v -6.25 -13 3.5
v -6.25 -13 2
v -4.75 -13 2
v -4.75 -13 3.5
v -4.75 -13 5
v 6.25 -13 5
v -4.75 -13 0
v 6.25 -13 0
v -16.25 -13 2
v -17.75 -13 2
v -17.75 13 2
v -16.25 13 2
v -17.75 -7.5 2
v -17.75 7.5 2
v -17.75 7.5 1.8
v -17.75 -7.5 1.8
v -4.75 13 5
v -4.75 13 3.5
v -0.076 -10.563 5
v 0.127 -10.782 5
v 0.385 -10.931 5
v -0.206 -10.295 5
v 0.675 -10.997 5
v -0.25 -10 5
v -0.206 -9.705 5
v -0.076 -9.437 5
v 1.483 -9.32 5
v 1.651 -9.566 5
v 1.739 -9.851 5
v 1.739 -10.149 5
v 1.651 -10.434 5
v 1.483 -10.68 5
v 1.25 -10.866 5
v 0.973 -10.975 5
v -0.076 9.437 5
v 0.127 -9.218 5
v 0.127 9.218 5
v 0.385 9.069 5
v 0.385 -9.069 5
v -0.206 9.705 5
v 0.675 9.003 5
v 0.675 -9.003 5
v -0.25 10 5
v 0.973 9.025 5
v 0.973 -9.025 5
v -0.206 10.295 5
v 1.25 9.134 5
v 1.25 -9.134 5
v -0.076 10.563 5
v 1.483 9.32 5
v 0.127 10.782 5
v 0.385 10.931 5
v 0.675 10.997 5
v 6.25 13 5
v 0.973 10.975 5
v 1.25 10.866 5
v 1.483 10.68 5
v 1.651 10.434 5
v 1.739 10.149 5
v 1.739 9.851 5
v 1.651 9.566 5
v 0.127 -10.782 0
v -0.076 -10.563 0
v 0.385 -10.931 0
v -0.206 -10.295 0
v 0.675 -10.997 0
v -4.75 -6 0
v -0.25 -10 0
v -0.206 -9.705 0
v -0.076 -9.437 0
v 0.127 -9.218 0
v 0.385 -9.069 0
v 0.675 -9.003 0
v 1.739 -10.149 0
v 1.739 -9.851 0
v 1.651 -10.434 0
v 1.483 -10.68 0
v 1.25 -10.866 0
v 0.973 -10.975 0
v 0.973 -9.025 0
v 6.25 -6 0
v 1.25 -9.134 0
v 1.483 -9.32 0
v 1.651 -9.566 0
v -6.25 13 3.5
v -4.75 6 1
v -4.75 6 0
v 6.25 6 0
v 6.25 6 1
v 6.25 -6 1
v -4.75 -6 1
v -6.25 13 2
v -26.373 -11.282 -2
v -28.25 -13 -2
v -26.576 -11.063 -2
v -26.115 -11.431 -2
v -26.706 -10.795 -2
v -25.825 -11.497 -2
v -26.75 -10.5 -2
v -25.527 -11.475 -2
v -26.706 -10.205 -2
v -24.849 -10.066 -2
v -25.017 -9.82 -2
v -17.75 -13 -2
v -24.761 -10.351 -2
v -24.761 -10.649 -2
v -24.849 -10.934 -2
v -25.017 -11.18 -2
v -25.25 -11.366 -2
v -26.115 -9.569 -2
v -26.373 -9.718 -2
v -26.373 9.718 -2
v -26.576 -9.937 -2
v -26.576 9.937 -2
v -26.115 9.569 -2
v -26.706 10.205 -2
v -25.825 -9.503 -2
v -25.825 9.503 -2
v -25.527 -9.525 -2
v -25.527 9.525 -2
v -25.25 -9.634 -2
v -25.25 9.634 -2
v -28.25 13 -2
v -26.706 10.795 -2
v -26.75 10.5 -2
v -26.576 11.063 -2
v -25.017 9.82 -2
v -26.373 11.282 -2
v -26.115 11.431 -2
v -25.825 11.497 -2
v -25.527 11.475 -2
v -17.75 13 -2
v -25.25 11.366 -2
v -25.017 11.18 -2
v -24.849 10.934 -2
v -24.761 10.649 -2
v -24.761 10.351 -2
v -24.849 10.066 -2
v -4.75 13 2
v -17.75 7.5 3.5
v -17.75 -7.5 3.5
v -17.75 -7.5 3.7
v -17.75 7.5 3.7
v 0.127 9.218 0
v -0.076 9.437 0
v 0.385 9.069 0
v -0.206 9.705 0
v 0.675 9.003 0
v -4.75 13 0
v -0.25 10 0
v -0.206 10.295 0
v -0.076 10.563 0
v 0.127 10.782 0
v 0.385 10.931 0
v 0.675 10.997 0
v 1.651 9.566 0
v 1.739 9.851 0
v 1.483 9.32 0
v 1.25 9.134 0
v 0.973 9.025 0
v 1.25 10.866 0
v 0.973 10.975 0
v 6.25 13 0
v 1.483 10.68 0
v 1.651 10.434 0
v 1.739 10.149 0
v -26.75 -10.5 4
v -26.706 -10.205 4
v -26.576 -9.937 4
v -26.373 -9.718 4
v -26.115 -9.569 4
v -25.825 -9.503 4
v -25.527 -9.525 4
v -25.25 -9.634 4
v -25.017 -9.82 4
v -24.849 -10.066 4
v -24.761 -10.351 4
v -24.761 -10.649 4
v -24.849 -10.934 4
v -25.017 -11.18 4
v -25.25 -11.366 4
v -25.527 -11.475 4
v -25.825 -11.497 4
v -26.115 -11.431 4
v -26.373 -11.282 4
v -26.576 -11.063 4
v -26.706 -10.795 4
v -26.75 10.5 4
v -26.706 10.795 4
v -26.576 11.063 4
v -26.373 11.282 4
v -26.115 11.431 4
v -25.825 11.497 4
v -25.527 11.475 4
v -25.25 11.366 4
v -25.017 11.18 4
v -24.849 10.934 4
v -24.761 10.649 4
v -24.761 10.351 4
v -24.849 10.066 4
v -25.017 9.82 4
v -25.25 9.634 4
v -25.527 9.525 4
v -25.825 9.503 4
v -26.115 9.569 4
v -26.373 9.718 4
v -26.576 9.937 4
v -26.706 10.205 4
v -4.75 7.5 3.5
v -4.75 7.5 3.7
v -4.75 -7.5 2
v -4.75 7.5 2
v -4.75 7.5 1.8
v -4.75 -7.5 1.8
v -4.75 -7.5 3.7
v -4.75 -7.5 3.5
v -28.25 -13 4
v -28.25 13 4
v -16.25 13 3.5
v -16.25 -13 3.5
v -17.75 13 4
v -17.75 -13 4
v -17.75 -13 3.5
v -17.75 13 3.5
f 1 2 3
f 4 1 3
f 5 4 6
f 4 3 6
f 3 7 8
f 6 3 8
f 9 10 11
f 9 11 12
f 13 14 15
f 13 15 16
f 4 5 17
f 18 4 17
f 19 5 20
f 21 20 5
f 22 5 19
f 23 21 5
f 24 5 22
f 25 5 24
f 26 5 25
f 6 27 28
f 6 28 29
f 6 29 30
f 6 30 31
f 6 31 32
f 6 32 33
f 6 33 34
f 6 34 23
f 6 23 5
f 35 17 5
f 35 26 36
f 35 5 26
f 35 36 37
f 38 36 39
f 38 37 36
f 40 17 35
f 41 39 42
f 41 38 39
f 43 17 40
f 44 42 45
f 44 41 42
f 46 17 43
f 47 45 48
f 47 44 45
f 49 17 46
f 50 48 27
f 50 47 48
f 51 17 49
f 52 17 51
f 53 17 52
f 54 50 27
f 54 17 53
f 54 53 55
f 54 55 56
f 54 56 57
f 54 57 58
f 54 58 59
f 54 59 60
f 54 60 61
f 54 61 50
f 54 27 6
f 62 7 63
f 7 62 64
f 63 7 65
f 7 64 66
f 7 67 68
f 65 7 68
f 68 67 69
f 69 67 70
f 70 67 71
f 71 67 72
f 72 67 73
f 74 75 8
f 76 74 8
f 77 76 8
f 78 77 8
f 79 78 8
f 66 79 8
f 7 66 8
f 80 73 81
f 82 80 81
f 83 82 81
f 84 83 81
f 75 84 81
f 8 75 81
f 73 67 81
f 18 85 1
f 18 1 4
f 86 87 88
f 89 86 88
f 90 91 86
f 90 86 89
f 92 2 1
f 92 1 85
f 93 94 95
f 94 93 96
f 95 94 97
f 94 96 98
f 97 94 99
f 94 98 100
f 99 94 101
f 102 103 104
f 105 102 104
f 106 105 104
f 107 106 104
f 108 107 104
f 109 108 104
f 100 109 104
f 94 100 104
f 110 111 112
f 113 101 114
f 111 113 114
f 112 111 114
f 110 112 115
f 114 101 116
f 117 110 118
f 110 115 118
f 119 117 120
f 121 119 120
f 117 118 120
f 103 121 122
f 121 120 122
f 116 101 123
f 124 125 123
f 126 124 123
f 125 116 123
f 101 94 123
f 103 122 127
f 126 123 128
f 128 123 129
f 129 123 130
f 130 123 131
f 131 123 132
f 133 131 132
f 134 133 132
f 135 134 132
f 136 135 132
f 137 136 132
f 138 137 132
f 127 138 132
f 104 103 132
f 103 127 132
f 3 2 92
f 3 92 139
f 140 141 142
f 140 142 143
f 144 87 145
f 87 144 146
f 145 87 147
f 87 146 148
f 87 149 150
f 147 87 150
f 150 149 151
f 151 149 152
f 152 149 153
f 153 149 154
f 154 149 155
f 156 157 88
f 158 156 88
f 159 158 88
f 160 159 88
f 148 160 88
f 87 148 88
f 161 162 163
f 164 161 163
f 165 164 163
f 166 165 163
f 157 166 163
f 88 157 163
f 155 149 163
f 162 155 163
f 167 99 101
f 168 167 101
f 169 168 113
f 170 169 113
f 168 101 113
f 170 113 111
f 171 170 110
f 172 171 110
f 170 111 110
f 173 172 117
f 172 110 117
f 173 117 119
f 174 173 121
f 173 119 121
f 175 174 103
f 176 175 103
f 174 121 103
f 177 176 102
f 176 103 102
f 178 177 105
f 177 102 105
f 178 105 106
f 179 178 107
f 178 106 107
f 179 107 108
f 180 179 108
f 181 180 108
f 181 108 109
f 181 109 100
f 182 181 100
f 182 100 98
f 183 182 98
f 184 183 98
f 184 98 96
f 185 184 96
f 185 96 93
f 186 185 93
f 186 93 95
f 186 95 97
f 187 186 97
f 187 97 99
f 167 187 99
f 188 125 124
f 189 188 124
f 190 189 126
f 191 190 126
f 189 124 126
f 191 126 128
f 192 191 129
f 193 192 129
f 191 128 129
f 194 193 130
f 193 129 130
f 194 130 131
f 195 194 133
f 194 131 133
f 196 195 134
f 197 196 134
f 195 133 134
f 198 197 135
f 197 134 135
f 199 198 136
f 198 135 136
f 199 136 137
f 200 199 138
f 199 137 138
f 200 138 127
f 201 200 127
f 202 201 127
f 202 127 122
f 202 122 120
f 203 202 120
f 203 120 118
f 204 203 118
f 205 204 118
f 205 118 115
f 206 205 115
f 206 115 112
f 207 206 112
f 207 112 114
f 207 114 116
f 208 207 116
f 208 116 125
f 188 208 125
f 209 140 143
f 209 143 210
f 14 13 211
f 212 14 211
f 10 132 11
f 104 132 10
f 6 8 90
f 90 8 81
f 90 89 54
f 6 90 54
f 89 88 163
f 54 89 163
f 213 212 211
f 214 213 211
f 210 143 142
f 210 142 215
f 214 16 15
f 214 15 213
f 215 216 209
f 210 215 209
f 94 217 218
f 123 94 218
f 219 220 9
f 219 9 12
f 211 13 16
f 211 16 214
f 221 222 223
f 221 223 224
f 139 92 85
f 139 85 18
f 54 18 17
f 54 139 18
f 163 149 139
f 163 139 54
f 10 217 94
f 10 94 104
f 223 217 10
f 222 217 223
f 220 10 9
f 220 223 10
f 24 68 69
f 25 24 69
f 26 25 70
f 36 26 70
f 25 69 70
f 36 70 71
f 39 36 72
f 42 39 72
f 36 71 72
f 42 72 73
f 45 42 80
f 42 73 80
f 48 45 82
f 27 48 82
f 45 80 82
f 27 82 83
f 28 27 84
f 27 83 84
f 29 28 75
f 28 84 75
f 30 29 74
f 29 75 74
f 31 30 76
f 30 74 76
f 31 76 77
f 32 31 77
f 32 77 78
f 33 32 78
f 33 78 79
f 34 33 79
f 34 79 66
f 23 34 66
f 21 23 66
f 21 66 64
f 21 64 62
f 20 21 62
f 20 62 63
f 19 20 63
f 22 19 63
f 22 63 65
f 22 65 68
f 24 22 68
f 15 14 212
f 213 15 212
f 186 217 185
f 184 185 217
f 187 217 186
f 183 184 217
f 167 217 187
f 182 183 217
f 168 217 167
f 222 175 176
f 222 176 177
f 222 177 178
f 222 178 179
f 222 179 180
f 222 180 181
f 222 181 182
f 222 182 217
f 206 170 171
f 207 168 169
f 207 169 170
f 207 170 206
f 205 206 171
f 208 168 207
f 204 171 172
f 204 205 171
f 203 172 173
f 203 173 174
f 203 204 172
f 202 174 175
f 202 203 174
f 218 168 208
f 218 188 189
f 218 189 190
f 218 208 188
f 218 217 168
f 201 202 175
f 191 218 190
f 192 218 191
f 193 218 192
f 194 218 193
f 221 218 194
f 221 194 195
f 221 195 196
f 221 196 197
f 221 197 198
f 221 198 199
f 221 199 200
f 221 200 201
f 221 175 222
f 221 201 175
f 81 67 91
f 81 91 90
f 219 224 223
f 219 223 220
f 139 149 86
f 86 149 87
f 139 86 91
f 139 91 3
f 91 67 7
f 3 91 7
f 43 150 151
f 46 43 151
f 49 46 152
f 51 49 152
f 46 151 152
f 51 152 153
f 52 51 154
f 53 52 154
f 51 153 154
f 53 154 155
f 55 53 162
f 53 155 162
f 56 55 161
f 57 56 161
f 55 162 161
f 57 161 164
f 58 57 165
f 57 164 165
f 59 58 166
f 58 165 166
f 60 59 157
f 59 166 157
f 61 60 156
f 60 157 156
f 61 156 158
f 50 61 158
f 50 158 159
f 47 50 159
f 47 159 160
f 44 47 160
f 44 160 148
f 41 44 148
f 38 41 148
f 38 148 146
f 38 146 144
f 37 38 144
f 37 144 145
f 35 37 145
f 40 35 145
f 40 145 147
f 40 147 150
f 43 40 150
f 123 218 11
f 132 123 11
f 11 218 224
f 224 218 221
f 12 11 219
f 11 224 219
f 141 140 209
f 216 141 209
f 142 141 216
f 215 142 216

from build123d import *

# Parameters (mm, degrees)
F0_W           = 12.5
F0_H           = 26
F1_DEPTH       = 5
F2_W           = 1.5
F2_H           = 26
F3_DEPTH       = 1.5
F4_W           = 1.5
F4_H           = 26
F5_DEPTH       = 2
F6_W           = 11
F6_H           = 12
F7_DEPTH       = 1
F9_D           = 2
F9_DEPTH       = 10
F9_TIP         = 0.600860619
F10_W          = 13
F10_H          = 15
F11_DEPTH      = 0.2
F12_W          = 12
F12_H          = 26
F13_DEPTH      = 4
F13_DEPTH_BACK = 2
F14_W          = 1.5
F14_H          = 26
F15_DEPTH      = 0.5
F16_W          = 1.5
F16_H          = 26
F17_DEPTH      = 4
F19_D          = 2
F19_DEPTH      = 10
F19_TIP        = 0.600860619
F20_W          = 13
F20_H          = 15
F21_DEPTH      = 0.2


with BuildPart() as f1:
    # F0 (on Top) → F1 (new body)
    with BuildSketch(Plane.XY):
        Rectangle(F0_W, F0_H)
    extrude(amount=F1_DEPTH)

    # F2 (on face) → F3 (cut)
    with BuildSketch(Plane.XY.offset(5)):
        with Locations((-5.5, 0)):
            Rectangle(F2_W, F2_H)
    extrude(amount=-F3_DEPTH, mode=Mode.SUBTRACT)

    # F4 (on face) → F5 (cut)
    with BuildSketch(Plane(origin=(0, 0, 0), x_dir=(1, 0, 0), z_dir=(0, 0, -1))):
        with Locations((-5.5, 0)):
            Rectangle(F4_W, F4_H)
    extrude(amount=-F5_DEPTH, mode=Mode.SUBTRACT)

    # F6 (on face) → F7 (cut)
    with BuildSketch(Plane(origin=(0, 0, 0), x_dir=(1, 0, 0), z_dir=(0, 0, -1))):
        with Locations((0.75, 0)):
            Rectangle(F6_W, F6_H)
    extrude(amount=-F7_DEPTH, mode=Mode.SUBTRACT)

    # F9
    with Locations(Plane.XY.offset(5)):
        with Locations((0.75, 10), (0.75, -10)):
            Hole(F9_D / 2, depth=F9_DEPTH)
            with Locations((0, 0, -(F9_DEPTH + F9_TIP / 2))):  # 118° drill point
                Cone(0, F9_D / 2, F9_TIP, mode=Mode.SUBTRACT)


with BuildPart() as f11:
    # F10 (on face) → F11 (new body)
    with BuildSketch(Plane.XY.offset(3.5)):
        with Locations((-11.25, 0)):
            Rectangle(F10_W, F10_H)
    extrude(amount=F11_DEPTH)


with BuildPart() as f13:
    # F12 (on Top) → F13 (new body, two sides)
    with BuildSketch(Plane.XY) as f13_sk:
        with Locations((-22.25, 0)):
            Rectangle(F12_W, F12_H)
    extrude(amount=F13_DEPTH)
    extrude(f13_sk.sketch, amount=-F13_DEPTH_BACK)

    # F14 (on face) → F15 (cut)
    with BuildSketch(Plane.XY.offset(4)):
        with Locations((-17, 0)):
            Rectangle(F14_W, F14_H)
    extrude(amount=-F15_DEPTH, mode=Mode.SUBTRACT)

    # F16 (on face) → F17 (cut)
    with BuildSketch(Plane(origin=(0, 0, -2), x_dir=(1, 0, 0), z_dir=(0, 0, -1))):
        with Locations((-17, 0)):
            Rectangle(F16_W, F16_H)
    extrude(amount=-F17_DEPTH, mode=Mode.SUBTRACT)

    # F19
    with Locations(Plane.XY.offset(4)):
        with Locations((-25.75, 10.5), (-25.75, -10.5)):
            Hole(F19_D / 2, depth=F19_DEPTH)
            with Locations((0, 0, -(F19_DEPTH + F19_TIP / 2))):  # 118° drill point
                Cone(0, F19_D / 2, F19_TIP, mode=Mode.SUBTRACT)


with BuildPart() as f21:
    # F20 (on face) → F21 (new body)
    with BuildSketch(Plane(origin=(0, 0, 2), x_dir=(1, 0, 0), z_dir=(0, 0, -1))):
        with Locations((-11.25, 0)):
            Rectangle(F20_W, F20_H)
    extrude(amount=F21_DEPTH)


solid = Compound([f1.part, f11.part, f13.part, f21.part])
